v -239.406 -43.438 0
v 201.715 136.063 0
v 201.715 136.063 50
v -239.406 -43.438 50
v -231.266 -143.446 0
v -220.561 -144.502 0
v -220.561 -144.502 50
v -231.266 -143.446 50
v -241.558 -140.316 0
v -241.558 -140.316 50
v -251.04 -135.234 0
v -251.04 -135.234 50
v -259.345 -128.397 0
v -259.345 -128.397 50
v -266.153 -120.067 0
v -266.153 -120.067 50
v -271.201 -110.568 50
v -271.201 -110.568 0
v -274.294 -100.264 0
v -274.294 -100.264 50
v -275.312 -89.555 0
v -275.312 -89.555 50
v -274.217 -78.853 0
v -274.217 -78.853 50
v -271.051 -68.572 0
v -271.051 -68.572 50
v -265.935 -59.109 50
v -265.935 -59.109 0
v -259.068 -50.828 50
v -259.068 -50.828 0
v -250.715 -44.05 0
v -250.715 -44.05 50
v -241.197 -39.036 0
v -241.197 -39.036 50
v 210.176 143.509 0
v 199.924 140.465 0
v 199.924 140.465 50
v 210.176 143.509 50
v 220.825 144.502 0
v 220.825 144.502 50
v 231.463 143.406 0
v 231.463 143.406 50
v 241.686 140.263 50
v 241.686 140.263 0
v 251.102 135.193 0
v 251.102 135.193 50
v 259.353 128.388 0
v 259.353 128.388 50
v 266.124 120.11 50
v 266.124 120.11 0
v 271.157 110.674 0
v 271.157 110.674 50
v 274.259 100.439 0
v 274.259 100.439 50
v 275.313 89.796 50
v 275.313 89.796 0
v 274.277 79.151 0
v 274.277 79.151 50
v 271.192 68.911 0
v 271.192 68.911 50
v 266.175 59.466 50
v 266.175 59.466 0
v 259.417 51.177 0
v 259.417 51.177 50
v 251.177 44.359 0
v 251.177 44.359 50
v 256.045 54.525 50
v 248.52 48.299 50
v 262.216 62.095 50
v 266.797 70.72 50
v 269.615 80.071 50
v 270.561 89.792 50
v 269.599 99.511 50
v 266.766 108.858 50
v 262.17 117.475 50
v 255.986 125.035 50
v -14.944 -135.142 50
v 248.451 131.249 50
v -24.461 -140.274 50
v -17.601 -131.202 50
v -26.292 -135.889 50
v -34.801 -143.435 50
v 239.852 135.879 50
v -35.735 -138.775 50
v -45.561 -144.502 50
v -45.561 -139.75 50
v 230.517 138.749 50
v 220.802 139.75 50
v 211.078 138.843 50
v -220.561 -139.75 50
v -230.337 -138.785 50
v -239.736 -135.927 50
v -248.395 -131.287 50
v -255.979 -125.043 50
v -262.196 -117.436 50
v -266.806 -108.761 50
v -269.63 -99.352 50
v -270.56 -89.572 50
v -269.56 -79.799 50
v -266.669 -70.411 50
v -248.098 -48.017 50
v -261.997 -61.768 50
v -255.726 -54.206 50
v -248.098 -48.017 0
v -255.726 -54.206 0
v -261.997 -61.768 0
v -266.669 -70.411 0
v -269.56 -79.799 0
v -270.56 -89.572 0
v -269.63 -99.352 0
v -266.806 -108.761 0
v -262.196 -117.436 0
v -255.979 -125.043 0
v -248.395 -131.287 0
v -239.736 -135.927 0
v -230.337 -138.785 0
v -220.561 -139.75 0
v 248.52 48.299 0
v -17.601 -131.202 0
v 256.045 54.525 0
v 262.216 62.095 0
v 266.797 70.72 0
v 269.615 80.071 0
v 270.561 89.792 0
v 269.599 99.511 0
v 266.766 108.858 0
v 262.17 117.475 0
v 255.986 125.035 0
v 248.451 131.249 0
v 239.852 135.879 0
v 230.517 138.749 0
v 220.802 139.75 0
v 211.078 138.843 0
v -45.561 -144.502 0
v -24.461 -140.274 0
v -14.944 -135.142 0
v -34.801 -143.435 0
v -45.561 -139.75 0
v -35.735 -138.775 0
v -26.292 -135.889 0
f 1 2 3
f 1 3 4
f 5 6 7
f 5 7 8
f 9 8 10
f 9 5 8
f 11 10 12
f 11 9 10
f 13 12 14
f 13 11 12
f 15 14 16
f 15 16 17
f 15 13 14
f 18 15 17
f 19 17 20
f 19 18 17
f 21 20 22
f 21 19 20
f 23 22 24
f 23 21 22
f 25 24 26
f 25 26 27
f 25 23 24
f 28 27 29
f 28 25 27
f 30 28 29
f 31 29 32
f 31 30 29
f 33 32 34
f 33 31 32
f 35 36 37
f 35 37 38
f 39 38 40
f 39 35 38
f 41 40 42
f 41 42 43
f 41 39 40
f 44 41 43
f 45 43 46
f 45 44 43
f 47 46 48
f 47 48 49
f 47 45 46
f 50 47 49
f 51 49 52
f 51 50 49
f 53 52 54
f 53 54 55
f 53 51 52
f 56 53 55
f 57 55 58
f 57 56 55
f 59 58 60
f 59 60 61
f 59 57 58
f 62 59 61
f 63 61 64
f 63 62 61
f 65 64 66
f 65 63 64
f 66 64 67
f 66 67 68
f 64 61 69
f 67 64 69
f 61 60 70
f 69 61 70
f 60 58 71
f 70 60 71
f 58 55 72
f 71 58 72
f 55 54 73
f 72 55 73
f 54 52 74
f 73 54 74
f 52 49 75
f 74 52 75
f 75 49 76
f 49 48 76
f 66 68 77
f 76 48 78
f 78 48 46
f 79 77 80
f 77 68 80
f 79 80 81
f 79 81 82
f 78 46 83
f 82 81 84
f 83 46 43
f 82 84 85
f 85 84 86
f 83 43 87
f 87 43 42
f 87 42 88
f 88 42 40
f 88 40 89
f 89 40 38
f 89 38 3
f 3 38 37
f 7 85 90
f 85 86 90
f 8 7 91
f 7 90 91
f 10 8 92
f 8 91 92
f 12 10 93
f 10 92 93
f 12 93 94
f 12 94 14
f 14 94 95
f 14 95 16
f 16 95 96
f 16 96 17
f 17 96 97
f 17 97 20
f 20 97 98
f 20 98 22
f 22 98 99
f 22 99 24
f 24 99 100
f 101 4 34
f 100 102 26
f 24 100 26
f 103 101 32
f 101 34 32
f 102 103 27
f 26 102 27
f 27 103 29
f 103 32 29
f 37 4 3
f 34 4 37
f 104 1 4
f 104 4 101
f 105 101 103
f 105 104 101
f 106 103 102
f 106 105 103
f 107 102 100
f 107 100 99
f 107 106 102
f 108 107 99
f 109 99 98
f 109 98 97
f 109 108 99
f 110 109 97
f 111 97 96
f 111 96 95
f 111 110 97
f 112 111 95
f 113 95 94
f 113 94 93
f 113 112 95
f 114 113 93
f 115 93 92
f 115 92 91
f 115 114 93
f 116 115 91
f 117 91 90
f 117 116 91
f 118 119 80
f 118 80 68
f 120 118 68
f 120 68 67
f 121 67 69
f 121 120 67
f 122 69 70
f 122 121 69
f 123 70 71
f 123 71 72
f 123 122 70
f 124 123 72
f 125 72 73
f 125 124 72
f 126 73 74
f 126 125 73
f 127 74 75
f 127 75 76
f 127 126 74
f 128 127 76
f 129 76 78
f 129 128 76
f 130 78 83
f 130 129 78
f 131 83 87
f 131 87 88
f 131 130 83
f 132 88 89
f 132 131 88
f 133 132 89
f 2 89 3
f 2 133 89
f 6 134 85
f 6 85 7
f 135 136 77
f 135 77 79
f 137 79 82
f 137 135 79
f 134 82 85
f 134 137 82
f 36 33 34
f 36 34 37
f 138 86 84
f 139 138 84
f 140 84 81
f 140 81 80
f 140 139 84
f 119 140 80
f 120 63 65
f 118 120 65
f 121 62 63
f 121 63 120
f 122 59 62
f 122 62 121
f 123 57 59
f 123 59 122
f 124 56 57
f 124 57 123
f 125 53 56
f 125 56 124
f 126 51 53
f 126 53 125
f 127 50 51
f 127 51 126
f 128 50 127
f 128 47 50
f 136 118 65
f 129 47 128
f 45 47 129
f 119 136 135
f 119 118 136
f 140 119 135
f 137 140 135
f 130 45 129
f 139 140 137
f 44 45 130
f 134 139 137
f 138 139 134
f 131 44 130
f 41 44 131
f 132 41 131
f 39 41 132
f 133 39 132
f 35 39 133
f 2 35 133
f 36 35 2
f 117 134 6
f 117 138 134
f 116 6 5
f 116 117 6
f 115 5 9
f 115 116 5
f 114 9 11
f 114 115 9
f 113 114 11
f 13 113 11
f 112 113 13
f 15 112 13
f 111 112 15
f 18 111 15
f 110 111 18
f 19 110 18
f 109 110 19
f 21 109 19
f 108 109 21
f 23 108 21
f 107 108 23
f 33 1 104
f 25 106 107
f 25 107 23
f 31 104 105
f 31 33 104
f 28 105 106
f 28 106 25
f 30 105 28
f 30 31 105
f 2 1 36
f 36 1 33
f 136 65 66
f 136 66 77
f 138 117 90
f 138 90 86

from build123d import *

# Parameters (mm, degrees)
EXTRUDE_1_DEPTH = 50


with BuildPart() as part:
    # 스케치2 → 보스-돌출1 (new body)
    with BuildSketch(Plane.XY):
        with BuildLine():
            Line((-241.197082179, -39.036417247), (199.923978611, 140.464504767))
            ThreePointArc((199.923978611, 140.464504767), (268.871700929, 115.515016226), (251.177460246, 44.358995835))
            Line((251.177460246, 44.358995835), (-14.943600544, -135.14192618))
            ThreePointArc((-14.943600544, -135.14192618), (-29.552594818, -142.110059006), (-45.560530395, -144.502461007))
            Line((-45.560530395, -144.502461007), (-220.560530395, -144.502461007))
            ThreePointArc((-220.560530395, -144.502461007), (-274.293559474, -100.264408412), (-241.197082179, -39.036417247))
        make_face()
        with BuildLine():
            Line((-220.560530395, -139.750461007), (-45.560530395, -139.750461007))
            ThreePointArc((-45.560530395, -139.750461007), (-30.941945159, -137.565698805), (-17.600885222, -131.202339635))
            Line((-17.600885222, -131.202339635), (248.520175569, 48.298582379))
            ThreePointArc((248.520175569, 48.298582379), (264.678709214, 113.278875694), (201.715052802, 136.062964441))
            Line((201.715052802, 136.062964441), (-239.406007988, -43.437957574))
            ThreePointArc((-239.406007988, -43.437957574), (-269.629997336, -99.351888722), (-220.560530395, -139.750461007))
        make_face(mode=Mode.SUBTRACT)
    extrude(amount=EXTRUDE_1_DEPTH)


solid = part.part
